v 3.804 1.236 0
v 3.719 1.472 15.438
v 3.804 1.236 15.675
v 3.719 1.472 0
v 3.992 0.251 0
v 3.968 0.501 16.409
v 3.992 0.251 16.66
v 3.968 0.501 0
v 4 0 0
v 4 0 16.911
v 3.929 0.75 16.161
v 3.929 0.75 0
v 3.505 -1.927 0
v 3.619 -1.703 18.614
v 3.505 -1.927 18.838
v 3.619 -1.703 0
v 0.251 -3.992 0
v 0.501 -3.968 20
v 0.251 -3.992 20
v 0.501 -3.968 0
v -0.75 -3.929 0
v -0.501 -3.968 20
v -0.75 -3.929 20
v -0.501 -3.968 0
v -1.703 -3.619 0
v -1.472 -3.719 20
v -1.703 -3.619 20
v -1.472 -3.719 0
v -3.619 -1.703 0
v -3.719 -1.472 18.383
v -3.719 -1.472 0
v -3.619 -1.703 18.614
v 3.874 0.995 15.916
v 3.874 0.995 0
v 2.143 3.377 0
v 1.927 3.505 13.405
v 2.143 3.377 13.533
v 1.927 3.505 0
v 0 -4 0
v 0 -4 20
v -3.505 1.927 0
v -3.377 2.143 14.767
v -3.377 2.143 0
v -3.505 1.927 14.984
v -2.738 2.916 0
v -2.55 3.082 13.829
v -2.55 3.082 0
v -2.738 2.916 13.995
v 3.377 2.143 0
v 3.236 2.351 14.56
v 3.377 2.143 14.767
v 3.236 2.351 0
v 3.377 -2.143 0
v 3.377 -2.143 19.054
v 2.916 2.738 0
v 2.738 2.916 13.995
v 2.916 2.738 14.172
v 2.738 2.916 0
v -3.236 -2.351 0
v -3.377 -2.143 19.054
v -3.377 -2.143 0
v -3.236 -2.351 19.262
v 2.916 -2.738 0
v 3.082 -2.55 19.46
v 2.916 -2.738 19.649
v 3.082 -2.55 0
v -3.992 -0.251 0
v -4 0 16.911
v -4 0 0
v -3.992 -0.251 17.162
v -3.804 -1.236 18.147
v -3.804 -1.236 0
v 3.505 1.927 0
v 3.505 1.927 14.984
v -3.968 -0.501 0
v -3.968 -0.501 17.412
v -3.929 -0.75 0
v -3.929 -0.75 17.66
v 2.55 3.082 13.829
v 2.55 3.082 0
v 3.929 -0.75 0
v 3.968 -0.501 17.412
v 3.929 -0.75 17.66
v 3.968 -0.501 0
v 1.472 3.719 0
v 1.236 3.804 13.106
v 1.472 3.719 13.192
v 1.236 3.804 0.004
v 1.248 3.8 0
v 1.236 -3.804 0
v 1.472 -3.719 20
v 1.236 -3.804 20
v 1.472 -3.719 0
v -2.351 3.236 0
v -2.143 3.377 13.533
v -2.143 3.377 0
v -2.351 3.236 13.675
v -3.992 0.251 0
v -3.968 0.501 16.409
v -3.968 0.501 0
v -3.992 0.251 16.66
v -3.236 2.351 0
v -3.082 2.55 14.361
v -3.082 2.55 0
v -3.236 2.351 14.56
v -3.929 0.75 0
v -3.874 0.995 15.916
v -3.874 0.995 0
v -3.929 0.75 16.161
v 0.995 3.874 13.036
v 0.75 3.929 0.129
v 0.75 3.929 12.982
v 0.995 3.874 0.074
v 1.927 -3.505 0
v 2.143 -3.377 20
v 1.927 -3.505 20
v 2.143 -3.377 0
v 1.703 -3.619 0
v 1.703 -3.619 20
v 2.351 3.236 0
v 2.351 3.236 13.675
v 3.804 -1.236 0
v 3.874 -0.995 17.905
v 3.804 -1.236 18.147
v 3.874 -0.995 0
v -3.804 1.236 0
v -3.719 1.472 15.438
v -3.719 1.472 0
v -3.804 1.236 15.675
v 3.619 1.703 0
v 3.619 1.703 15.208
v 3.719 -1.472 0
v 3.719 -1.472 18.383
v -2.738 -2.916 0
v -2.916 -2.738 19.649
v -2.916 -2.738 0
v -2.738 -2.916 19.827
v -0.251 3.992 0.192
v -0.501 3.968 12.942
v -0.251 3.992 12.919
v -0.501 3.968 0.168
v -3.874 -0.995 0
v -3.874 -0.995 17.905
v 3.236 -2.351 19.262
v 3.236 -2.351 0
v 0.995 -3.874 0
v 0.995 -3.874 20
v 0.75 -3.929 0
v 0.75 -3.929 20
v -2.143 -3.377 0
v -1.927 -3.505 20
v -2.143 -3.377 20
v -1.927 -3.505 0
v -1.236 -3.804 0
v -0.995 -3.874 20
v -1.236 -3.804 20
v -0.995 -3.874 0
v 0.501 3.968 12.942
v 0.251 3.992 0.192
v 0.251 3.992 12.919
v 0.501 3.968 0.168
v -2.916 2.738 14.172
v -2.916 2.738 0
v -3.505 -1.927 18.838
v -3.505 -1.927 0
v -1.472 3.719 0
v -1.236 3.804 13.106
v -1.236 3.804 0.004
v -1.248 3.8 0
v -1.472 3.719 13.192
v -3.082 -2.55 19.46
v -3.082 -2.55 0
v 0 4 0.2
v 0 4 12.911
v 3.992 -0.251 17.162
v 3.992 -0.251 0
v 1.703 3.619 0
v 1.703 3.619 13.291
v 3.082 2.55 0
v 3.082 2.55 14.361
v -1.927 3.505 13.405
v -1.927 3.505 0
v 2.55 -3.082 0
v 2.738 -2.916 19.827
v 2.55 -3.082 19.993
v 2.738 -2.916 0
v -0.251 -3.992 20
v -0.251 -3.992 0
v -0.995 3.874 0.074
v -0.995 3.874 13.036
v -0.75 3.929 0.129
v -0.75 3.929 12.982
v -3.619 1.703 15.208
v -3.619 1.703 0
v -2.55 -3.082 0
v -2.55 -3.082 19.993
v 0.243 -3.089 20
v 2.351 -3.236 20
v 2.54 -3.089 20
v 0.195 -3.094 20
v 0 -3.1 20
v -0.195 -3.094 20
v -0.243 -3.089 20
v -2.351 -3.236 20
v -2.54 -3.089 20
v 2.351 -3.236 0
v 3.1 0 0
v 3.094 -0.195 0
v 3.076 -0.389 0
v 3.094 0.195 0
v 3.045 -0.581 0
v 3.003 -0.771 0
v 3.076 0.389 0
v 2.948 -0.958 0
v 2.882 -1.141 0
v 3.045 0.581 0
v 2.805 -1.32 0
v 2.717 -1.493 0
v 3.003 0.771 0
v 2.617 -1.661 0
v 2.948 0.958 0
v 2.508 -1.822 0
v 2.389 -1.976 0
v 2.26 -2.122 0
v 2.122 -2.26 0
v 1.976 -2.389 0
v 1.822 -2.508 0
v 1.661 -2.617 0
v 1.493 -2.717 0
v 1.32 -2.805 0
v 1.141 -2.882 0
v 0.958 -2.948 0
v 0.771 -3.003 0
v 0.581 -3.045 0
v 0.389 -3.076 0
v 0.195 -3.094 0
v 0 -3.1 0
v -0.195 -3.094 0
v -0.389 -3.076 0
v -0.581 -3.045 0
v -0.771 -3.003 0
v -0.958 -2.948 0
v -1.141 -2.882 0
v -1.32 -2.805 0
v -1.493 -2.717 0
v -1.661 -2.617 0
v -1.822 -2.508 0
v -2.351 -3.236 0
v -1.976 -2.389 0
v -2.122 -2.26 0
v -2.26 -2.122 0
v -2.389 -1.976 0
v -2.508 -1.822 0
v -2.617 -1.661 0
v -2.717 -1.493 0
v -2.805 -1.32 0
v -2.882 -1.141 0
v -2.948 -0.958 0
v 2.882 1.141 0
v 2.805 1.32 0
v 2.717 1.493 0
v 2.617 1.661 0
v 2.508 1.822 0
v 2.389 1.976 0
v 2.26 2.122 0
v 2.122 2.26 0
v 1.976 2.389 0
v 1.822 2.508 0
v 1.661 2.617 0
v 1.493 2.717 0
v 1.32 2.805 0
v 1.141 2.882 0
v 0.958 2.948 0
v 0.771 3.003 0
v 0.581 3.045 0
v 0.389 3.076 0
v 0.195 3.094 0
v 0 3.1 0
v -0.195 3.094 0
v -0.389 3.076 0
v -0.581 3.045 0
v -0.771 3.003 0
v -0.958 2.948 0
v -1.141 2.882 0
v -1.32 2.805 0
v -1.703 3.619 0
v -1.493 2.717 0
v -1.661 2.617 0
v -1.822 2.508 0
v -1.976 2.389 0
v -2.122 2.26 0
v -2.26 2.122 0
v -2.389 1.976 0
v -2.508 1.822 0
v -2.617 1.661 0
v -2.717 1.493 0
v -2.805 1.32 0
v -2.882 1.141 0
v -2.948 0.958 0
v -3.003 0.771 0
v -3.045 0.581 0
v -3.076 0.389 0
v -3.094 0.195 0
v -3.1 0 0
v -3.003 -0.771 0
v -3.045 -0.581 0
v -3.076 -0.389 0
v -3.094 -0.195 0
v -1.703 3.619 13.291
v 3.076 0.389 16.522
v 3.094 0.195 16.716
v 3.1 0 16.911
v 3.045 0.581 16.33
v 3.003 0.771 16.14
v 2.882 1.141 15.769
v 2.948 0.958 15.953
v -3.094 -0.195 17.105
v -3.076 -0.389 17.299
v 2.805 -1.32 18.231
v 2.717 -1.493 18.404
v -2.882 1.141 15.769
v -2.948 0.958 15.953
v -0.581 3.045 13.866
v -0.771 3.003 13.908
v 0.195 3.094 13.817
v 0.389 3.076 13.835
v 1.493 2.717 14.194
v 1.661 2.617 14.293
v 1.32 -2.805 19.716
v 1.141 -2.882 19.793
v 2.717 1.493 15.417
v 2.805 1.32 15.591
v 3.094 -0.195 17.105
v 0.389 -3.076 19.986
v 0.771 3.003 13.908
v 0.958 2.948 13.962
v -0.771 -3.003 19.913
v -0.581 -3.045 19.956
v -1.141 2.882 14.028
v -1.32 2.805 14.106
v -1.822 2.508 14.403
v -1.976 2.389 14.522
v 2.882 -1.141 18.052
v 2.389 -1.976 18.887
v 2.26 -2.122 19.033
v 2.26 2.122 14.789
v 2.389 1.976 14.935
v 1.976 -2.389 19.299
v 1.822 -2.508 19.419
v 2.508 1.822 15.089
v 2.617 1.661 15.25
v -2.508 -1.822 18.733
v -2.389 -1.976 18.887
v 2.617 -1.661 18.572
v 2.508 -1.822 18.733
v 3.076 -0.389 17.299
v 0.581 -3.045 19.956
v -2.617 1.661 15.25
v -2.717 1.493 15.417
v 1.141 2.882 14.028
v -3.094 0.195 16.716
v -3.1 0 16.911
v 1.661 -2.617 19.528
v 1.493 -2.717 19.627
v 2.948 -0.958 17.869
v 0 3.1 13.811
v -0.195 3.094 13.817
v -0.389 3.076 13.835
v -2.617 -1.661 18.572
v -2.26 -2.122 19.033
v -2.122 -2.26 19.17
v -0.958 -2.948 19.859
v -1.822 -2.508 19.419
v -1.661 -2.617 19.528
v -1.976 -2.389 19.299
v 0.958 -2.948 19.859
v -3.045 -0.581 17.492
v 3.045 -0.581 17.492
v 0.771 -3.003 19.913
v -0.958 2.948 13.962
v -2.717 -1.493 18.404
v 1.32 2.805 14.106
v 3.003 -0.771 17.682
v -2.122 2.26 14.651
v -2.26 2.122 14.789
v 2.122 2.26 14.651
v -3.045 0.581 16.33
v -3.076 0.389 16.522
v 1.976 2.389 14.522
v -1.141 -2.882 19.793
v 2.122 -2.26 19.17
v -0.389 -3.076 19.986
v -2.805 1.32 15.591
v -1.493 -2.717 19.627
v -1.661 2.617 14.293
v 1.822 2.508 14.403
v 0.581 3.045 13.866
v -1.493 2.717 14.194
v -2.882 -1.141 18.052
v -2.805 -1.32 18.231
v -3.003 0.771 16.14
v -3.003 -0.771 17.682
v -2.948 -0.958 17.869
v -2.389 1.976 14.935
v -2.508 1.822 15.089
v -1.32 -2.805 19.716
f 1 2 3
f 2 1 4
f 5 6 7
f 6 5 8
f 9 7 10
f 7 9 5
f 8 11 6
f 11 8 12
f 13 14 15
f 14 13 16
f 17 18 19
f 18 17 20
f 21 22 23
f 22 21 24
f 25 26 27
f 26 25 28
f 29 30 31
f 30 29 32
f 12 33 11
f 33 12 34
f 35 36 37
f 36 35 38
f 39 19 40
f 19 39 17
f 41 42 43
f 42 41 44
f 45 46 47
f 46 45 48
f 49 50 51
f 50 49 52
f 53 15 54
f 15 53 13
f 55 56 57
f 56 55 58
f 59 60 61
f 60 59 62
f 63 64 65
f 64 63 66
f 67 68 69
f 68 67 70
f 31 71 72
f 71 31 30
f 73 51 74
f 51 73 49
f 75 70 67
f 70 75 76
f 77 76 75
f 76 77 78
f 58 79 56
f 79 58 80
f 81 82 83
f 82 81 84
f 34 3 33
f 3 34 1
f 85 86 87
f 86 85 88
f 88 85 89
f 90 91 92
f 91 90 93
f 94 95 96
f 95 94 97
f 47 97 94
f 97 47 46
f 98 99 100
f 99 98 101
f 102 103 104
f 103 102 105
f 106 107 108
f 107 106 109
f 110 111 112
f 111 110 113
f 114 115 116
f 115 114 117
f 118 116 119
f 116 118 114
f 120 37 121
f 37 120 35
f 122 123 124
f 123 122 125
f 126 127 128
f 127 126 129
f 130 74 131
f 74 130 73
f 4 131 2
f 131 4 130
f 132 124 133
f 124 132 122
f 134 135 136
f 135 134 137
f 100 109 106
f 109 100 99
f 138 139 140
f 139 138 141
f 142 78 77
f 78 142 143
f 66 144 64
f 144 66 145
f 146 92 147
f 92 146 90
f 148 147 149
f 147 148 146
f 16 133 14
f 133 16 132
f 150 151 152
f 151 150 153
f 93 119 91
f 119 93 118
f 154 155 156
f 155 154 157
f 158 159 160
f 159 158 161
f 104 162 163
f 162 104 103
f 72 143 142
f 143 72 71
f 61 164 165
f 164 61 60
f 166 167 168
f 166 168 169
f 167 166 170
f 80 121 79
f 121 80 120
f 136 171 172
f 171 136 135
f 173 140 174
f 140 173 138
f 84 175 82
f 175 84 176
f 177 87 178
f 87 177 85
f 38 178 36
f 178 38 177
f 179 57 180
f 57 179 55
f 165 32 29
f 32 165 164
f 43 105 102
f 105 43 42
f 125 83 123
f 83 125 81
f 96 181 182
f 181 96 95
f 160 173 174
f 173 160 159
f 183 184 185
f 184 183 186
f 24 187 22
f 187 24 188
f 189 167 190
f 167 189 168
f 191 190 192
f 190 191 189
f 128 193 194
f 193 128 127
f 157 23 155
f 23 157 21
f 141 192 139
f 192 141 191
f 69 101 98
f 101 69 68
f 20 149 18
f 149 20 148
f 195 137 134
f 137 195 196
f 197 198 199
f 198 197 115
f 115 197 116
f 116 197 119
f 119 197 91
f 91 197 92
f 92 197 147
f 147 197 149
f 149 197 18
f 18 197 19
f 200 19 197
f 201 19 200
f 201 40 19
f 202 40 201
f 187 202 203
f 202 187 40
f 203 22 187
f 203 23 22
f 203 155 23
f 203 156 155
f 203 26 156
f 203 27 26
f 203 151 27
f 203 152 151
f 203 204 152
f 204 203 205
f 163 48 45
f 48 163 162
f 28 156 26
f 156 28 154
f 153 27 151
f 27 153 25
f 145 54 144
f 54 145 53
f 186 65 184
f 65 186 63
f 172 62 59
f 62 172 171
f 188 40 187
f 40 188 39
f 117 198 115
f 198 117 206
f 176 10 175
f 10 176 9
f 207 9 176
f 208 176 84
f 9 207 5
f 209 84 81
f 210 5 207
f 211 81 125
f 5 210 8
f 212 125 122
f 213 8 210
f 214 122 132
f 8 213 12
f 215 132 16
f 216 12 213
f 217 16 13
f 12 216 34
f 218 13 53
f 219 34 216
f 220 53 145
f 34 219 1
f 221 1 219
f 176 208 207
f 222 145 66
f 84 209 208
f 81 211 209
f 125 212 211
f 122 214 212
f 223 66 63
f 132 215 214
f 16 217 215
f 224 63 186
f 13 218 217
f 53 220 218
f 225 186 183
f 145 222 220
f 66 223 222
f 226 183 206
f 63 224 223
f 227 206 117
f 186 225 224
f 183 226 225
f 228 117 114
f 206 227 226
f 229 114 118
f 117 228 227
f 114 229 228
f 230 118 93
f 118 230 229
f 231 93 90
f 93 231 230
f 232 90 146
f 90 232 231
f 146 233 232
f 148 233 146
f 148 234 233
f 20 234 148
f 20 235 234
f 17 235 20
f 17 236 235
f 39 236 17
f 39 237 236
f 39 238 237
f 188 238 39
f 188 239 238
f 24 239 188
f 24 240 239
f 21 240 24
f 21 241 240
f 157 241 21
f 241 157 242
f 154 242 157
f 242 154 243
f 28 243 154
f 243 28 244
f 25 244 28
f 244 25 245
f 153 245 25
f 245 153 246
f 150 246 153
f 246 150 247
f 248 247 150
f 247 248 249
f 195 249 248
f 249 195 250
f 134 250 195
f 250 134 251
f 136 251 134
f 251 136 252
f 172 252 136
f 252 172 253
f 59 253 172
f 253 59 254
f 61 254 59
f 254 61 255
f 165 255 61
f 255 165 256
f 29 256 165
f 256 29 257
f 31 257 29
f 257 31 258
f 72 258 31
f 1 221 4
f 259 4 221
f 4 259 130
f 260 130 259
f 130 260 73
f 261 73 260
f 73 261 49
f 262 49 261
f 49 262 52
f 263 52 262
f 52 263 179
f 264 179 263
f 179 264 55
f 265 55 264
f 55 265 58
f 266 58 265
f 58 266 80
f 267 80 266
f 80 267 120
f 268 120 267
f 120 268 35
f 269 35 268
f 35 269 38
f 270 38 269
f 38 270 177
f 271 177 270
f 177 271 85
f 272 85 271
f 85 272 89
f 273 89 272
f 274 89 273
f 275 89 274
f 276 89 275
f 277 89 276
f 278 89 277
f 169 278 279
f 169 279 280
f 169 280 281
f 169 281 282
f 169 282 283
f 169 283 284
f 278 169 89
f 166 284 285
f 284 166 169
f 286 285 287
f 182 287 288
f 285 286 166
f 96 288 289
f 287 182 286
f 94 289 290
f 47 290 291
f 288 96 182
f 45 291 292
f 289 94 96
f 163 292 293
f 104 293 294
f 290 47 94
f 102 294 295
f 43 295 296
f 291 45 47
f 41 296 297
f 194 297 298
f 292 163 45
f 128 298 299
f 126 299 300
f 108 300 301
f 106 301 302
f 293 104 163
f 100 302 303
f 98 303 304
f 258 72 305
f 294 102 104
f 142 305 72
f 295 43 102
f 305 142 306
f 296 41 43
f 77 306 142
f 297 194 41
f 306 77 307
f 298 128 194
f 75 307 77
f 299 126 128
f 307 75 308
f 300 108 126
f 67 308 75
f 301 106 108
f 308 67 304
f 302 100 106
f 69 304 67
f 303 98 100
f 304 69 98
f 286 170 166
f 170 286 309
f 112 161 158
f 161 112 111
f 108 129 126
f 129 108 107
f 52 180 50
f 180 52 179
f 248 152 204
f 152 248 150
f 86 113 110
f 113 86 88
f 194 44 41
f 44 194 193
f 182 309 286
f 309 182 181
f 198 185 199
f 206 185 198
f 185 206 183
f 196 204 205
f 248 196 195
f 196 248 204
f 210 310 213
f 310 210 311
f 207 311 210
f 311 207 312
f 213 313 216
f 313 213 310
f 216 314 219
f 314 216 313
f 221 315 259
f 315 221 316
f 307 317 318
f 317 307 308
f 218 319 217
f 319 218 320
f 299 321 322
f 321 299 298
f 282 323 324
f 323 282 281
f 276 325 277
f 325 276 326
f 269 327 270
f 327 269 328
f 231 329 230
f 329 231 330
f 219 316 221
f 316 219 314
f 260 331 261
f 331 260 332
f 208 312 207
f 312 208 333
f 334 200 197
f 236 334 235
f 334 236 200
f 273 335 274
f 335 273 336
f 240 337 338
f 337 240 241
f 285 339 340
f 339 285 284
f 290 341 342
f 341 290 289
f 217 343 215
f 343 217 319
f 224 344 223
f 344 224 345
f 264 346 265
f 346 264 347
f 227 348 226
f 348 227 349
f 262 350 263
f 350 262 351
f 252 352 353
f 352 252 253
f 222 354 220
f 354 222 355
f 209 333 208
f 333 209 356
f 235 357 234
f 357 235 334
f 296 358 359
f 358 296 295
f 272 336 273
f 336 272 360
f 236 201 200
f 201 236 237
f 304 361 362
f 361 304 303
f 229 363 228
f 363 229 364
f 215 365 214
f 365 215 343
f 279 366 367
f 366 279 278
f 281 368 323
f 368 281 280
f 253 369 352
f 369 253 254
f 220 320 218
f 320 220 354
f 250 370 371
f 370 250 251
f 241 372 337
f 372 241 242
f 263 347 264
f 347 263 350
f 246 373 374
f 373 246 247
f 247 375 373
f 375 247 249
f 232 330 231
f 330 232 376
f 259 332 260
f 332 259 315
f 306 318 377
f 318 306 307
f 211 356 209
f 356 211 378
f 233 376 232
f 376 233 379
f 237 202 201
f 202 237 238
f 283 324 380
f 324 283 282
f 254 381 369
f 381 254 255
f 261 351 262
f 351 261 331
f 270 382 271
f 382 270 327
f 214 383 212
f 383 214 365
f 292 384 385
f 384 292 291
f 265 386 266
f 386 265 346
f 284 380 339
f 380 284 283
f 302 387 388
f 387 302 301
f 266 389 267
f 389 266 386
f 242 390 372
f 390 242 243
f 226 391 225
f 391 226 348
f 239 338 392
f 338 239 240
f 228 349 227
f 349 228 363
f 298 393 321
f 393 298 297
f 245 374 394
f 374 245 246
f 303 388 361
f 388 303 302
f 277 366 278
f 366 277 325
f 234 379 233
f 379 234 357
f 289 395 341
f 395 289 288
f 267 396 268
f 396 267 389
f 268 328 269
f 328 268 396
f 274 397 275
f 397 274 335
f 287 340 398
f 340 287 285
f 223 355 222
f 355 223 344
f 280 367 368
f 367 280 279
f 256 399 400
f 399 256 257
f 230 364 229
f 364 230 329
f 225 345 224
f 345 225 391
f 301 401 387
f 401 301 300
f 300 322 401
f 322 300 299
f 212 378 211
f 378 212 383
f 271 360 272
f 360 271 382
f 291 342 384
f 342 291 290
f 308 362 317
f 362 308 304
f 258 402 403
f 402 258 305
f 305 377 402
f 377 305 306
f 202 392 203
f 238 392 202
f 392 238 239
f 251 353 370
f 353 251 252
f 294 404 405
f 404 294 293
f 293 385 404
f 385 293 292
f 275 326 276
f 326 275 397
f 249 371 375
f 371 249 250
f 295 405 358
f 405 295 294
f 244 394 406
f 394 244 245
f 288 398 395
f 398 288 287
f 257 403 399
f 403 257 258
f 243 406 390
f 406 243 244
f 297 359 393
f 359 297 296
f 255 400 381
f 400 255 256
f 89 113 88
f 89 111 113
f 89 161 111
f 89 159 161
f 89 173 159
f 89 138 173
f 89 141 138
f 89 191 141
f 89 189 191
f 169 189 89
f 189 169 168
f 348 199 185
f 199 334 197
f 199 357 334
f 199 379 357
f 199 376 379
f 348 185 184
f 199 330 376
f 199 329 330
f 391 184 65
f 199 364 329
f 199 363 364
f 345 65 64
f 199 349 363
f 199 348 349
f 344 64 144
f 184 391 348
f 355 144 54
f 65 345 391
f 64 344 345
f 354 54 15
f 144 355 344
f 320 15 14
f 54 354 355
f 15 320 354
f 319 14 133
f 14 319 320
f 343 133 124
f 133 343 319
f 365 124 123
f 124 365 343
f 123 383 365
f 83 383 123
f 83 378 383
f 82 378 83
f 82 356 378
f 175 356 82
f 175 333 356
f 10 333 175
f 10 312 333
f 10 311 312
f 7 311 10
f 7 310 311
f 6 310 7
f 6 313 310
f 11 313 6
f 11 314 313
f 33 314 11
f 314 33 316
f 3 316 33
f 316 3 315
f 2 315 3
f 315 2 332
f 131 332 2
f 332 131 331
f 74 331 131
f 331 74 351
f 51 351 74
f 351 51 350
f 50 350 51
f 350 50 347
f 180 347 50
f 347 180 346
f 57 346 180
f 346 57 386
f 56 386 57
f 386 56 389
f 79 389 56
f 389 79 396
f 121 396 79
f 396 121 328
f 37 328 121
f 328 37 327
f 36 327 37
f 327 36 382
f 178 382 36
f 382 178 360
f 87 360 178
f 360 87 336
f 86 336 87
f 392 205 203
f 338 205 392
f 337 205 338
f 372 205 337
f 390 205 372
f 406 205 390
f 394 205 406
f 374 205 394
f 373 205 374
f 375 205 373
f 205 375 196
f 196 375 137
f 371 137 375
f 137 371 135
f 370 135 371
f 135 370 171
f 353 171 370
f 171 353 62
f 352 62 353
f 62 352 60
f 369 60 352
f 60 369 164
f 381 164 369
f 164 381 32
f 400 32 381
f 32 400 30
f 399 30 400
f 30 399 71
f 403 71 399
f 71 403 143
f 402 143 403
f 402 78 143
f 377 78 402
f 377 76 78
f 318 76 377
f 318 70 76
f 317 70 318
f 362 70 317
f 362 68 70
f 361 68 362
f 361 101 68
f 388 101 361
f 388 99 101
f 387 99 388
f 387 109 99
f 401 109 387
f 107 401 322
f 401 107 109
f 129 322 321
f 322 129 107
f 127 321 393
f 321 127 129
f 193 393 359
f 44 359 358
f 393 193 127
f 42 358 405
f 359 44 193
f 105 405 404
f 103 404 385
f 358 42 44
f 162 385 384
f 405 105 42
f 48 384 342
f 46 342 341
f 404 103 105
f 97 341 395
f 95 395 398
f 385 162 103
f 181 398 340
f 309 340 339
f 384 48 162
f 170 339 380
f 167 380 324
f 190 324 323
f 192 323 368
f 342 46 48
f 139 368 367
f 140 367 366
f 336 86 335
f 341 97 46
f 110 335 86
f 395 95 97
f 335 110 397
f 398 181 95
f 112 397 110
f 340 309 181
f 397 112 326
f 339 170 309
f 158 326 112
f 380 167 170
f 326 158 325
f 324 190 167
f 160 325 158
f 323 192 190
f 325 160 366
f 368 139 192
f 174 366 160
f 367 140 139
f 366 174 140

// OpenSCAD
eps = 0.01;
rod_d = 5+1.2;

module rod_guide()
{
  intersection()
  {
    // main block
    difference()
    {
      cylinder(d=rod_d+3*0.6, h=20, $fn=100);
      translate([0, 0, -eps])
        cylinder(d=rod_d, h=20+2*eps, $fn=100);
    }
    // cut at the top, to minimize drag
    translate([-50/2, -50/2, -30+1.2])
      rotate([45, 0, 0])
    cube([50, 50, 50]);
  }
}

rod_guide();
